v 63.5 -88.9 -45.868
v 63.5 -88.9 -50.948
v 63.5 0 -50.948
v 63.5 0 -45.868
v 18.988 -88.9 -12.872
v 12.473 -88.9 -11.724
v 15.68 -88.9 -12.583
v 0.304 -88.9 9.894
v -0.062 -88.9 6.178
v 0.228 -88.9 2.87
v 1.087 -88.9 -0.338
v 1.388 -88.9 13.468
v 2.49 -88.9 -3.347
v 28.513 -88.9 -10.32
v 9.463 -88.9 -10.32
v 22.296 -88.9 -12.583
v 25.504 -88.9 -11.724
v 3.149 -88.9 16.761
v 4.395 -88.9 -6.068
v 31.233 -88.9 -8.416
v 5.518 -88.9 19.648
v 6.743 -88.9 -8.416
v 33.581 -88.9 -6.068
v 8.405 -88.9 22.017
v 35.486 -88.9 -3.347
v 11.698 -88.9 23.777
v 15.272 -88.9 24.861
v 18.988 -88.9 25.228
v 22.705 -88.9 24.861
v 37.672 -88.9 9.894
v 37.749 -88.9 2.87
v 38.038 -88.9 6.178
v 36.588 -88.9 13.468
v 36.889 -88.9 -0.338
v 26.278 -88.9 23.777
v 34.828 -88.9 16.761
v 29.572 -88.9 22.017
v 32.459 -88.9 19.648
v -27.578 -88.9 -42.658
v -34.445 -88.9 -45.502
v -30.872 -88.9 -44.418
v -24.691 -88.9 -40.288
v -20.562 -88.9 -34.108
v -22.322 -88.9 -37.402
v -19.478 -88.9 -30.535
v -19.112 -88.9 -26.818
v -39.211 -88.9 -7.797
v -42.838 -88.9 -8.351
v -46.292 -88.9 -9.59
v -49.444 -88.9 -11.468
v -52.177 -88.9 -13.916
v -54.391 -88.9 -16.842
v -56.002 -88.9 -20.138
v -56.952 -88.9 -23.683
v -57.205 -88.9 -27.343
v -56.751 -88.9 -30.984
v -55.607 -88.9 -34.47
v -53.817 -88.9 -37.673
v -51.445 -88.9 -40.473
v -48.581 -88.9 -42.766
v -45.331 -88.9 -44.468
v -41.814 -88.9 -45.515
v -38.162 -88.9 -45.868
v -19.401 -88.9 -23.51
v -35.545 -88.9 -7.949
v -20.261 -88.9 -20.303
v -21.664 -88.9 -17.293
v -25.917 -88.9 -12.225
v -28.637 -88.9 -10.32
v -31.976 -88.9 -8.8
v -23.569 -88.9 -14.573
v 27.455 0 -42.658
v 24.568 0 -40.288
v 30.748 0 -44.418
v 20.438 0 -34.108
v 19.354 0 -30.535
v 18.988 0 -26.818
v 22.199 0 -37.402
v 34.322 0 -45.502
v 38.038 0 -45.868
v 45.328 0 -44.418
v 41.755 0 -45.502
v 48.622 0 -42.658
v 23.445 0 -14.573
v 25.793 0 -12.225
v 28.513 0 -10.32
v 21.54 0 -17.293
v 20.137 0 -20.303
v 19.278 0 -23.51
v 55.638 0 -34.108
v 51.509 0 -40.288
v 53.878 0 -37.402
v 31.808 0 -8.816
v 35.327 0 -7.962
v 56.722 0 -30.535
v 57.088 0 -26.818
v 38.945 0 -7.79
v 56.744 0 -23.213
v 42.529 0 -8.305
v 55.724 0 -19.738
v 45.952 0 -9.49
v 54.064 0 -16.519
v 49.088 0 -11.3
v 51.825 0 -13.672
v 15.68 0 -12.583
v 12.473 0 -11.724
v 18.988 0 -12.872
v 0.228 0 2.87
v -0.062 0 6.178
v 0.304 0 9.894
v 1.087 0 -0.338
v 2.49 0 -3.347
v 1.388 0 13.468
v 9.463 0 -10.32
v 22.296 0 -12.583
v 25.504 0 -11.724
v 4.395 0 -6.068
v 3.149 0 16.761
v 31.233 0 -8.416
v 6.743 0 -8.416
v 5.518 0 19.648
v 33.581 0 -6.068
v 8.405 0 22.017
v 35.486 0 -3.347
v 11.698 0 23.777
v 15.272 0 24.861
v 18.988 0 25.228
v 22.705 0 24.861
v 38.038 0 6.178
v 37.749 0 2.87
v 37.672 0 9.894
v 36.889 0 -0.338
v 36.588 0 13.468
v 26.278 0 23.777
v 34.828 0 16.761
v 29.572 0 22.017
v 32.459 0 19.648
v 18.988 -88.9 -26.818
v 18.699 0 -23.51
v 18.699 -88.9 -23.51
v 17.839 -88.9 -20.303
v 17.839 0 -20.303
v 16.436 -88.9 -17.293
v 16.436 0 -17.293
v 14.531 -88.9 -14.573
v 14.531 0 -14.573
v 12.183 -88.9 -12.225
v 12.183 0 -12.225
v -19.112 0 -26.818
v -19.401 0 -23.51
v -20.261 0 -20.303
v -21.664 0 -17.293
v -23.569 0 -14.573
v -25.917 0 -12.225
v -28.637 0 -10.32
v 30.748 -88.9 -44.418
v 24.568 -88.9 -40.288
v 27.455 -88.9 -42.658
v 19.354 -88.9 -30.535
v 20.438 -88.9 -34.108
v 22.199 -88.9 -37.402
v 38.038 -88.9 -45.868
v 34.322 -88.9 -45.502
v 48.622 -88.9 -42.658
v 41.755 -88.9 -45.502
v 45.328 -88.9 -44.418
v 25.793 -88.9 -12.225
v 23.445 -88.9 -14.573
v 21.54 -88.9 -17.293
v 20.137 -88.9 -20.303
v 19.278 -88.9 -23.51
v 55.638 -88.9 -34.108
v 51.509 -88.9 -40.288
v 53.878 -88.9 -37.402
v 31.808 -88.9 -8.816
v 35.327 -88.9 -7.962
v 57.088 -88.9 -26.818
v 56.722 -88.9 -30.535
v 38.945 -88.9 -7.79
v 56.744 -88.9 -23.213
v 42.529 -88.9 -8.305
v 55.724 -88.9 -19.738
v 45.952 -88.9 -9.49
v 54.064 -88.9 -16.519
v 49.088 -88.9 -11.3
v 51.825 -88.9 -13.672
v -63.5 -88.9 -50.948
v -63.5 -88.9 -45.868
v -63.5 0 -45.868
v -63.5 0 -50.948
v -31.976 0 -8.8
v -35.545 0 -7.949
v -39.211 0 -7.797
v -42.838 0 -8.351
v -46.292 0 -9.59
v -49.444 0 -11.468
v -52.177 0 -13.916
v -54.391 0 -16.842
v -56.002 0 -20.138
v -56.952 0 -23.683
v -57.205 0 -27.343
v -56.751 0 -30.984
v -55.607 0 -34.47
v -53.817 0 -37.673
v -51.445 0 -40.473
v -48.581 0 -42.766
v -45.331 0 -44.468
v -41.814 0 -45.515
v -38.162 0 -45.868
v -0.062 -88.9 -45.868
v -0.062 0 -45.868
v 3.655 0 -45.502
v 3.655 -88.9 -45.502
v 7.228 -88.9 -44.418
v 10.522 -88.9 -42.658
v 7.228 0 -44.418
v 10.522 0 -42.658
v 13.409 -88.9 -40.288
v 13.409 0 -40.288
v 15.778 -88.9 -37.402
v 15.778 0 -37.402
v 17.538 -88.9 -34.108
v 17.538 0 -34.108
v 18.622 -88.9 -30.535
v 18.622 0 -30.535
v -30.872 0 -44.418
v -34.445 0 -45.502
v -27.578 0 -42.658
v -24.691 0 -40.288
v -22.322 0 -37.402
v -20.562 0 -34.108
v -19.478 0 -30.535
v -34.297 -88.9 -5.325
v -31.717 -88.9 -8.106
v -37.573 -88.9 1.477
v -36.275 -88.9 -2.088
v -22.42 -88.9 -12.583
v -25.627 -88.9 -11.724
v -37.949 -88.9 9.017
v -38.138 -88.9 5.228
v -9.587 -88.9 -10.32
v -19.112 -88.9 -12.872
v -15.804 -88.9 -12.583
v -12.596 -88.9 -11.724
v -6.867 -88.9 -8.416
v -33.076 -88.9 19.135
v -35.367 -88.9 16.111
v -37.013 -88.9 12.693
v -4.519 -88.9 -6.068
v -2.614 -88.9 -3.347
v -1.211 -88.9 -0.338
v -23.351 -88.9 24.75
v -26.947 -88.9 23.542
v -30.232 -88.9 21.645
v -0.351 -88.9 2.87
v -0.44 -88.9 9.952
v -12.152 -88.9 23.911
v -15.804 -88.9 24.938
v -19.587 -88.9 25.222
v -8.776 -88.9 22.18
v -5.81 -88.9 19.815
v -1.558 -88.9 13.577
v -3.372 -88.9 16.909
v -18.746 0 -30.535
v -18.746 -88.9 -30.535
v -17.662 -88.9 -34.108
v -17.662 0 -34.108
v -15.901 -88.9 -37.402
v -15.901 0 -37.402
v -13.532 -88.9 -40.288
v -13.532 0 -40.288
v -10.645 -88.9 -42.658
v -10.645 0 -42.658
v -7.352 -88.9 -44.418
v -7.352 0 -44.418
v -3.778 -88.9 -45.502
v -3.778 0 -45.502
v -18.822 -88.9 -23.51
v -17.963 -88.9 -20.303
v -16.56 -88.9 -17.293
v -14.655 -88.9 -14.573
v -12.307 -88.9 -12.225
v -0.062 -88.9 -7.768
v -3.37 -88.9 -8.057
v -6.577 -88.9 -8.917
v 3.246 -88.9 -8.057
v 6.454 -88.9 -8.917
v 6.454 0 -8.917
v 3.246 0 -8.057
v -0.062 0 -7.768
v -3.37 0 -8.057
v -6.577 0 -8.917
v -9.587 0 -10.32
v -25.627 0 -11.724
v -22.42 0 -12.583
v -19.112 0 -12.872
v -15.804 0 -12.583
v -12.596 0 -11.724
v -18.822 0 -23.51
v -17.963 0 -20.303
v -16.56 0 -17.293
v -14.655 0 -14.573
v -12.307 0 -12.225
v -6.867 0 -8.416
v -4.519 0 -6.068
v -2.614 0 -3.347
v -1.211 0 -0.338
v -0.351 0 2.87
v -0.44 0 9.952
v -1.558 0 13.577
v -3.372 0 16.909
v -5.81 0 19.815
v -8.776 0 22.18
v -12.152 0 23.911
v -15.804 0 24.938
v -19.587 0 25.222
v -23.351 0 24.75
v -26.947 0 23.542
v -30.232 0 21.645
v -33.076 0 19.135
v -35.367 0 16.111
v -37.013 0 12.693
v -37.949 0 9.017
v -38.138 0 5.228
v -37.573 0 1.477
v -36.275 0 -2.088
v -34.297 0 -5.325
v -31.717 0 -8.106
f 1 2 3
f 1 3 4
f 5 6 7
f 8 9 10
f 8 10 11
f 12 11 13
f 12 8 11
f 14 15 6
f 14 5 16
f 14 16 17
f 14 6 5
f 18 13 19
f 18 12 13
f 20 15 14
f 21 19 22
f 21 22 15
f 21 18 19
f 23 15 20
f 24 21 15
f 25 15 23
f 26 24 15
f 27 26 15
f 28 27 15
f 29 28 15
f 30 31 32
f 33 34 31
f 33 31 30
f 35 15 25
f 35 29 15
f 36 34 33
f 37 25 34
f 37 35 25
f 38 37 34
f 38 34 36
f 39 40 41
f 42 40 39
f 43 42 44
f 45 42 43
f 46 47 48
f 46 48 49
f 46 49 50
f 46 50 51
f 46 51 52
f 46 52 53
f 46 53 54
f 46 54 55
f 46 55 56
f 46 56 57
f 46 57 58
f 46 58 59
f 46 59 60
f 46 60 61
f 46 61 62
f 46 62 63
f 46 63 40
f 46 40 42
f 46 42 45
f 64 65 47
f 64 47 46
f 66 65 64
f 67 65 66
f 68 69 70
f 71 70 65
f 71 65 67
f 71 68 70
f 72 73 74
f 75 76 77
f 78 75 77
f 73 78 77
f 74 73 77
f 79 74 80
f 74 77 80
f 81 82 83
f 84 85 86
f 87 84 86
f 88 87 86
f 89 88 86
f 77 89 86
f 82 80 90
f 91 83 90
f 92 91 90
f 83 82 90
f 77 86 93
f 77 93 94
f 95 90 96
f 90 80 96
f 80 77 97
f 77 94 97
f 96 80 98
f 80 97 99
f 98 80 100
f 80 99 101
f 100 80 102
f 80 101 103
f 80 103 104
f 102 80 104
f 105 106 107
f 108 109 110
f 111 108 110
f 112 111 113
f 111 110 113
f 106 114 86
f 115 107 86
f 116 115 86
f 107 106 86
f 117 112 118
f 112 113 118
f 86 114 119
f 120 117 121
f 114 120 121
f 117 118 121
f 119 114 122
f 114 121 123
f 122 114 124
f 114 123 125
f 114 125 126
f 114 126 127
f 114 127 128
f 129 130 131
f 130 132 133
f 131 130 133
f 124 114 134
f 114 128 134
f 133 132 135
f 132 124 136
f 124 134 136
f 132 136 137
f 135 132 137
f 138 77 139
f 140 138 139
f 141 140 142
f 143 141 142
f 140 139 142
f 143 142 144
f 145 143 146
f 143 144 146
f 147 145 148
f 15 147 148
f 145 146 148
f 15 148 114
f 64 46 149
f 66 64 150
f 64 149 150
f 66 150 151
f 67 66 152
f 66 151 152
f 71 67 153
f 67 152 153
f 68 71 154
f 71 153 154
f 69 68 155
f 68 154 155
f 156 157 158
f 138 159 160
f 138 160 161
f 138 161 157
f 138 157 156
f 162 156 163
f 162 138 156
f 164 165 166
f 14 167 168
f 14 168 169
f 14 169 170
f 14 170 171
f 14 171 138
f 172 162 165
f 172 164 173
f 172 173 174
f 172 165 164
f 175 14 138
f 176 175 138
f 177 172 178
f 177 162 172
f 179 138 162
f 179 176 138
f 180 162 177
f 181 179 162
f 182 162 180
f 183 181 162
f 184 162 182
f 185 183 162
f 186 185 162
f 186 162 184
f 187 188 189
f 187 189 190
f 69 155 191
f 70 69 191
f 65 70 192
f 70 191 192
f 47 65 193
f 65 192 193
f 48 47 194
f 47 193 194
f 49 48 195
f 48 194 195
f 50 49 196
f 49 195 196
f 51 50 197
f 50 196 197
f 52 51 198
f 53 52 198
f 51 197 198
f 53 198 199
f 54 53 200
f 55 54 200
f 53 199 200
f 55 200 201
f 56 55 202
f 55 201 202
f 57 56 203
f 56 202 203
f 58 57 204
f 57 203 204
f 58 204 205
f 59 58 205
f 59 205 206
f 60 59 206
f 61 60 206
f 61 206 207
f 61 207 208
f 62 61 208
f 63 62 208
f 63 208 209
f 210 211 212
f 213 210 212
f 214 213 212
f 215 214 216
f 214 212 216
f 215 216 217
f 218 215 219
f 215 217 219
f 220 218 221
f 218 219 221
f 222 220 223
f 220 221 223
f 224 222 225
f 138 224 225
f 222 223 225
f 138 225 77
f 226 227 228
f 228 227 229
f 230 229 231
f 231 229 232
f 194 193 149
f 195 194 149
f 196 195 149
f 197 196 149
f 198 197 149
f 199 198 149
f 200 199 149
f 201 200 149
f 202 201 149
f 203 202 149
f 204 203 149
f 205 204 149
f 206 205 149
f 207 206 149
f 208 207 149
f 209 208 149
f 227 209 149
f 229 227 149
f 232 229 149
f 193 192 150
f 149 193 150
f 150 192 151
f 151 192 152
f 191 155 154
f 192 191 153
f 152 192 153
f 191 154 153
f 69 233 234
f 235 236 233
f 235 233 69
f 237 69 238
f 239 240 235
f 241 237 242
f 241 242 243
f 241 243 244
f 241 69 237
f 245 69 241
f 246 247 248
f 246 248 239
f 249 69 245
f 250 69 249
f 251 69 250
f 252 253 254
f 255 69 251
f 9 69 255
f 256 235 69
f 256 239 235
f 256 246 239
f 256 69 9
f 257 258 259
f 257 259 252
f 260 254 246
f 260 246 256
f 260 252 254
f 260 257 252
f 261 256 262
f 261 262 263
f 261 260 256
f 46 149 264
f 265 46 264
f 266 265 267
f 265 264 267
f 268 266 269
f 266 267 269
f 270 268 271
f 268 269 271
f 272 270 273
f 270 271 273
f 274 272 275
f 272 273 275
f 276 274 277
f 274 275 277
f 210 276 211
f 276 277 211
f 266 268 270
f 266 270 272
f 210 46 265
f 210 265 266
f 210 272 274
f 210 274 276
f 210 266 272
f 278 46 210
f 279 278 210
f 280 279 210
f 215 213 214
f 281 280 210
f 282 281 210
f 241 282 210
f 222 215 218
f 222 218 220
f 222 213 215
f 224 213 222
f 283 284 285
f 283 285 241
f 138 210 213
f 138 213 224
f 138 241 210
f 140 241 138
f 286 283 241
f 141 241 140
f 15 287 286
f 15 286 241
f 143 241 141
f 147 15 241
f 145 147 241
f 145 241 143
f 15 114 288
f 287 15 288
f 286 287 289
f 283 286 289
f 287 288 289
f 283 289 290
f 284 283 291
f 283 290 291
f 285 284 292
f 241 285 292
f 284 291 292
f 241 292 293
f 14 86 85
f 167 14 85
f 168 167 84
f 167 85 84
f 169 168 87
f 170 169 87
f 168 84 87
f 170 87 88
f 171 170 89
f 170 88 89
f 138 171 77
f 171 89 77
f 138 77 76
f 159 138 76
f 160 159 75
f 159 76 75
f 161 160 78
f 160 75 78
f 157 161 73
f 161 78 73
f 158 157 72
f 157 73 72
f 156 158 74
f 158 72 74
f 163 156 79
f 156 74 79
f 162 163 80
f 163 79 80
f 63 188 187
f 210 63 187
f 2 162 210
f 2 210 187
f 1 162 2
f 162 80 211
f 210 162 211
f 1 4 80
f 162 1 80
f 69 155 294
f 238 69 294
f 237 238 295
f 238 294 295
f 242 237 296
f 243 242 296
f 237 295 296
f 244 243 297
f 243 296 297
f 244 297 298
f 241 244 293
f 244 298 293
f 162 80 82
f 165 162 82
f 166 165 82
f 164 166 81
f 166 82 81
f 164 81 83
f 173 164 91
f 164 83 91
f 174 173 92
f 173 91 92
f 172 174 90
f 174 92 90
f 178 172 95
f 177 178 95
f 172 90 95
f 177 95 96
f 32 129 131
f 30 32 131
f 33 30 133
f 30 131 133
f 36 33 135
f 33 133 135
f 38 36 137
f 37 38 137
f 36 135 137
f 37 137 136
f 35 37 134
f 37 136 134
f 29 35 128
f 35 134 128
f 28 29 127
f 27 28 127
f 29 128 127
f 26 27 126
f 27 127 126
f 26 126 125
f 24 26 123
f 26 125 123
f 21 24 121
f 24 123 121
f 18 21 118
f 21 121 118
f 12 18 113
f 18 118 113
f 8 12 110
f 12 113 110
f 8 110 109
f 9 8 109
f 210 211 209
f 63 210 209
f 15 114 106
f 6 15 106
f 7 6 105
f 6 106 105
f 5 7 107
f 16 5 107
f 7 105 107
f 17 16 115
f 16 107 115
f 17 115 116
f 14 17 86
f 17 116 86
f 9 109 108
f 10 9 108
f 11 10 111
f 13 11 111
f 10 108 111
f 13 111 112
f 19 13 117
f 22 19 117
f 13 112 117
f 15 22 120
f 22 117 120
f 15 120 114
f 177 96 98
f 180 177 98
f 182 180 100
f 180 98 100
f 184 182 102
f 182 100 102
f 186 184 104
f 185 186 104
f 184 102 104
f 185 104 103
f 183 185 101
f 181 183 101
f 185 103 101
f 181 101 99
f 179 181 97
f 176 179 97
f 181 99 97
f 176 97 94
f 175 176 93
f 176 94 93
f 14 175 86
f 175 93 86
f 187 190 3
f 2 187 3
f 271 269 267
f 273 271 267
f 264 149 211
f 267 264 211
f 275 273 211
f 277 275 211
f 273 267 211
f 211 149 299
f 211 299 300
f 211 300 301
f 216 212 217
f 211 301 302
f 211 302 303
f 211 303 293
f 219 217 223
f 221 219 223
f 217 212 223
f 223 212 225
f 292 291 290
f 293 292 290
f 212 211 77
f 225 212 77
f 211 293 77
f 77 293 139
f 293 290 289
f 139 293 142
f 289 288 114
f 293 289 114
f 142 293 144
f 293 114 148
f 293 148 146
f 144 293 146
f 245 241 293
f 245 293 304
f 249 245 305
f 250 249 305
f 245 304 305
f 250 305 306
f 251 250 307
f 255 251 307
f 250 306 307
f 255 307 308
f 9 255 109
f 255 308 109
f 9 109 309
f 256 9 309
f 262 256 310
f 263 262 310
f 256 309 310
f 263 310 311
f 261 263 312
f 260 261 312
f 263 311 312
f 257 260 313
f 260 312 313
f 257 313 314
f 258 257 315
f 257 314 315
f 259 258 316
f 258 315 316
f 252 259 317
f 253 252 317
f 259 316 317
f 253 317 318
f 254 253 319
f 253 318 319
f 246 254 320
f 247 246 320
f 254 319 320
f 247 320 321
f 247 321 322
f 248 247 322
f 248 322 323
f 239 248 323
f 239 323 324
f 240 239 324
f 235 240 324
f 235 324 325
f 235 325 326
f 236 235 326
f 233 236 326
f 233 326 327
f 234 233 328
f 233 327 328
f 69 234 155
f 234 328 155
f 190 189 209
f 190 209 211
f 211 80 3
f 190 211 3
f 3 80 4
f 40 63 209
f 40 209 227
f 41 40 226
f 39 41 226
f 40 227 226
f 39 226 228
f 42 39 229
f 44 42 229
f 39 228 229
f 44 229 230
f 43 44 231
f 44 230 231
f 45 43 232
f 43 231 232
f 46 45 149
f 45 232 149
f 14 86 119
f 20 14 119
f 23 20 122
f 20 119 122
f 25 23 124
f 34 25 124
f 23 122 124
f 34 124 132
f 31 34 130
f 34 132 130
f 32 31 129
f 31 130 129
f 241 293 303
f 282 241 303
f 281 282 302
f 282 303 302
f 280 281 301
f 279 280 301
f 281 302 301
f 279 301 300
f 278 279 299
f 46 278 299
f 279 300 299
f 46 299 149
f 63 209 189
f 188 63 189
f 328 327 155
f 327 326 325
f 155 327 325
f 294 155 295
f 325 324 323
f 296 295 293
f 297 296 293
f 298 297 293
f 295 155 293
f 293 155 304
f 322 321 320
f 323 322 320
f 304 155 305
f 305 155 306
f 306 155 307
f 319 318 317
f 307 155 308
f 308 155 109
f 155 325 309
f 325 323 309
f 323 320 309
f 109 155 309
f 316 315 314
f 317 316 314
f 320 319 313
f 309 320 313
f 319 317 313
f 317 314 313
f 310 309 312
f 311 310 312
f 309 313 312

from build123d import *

# Parameters (mm, degrees)
F1_DEPTH = 88.9


with BuildPart() as f1:
    # F0 (on Front) → F1 (new body)
    with BuildSketch(Plane.XZ):
        with BuildLine():
            ThreePointArc((-9.586811, -10.320259), (-2.614027, -3.347475), (-0.061811, 6.177525))
            ThreePointArc((-0.061811, 6.177525), (-28.636811, 22.675309), (-28.636811, -10.320258))
            ThreePointArc((-28.636811, -10.320258), (-19.111811, -12.872475), (-9.586811, -10.320259))
        make_face()
        with BuildLine():
            ThreePointArc((38.038189, 6.177525), (18.988189, 25.227525), (-0.061811, 6.177525))
            ThreePointArc((-0.061811, 6.177525), (2.490405, -3.347474), (9.463189, -10.320258))
            ThreePointArc((9.463189, -10.320258), (18.988189, -12.872475), (28.51319, -10.320258))
            ThreePointArc((28.51319, -10.320258), (35.485973, -3.347474), (38.038189, 6.177525))
        make_face()
        with BuildLine():
            ThreePointArc((9.463189, -10.320258), (-0.061811, -7.768042), (-9.586811, -10.320259))
            ThreePointArc((-9.586811, -10.320259), (-16.559595, -17.293043), (-19.111811, -26.818042))
            ThreePointArc((-19.111811, -26.818042), (-13.532195, -40.288427), (-0.061811, -45.868042))
            ThreePointArc((-0.061811, -45.868042), (13.408573, -40.288427), (18.988189, -26.818042))
            ThreePointArc((18.988189, -26.818042), (16.435973, -17.293042), (9.463189, -10.320258))
        make_face()
        with BuildLine():
            ThreePointArc((57.088189, -26.818042), (47.563189, -10.320259), (28.51319, -10.320258))
            ThreePointArc((28.51319, -10.320258), (21.540405, -17.293042), (18.988189, -26.818042))
            ThreePointArc((18.988189, -26.818042), (24.567805, -40.288427), (38.038189, -45.868042))
            ThreePointArc((38.038189, -45.868042), (51.508573, -40.288427), (57.088189, -26.818042))
        make_face()
        with BuildLine():
            ThreePointArc((-19.111811, -26.818042), (-21.664027, -17.293042), (-28.636811, -10.320258))
            ThreePointArc((-28.636811, -10.320258), (-56.562698, -21.88754), (-38.161811, -45.868042))
            ThreePointArc((-38.161811, -45.868042), (-24.691427, -40.288427), (-19.111811, -26.818042))
        make_face()
        Polygon((-0.061811, -45.868042), (-38.161811, -45.868042), (-63.5, -45.868042), (-63.5, -50.948042), (63.5, -50.948042), (63.5, -45.868042), (38.038189, -45.868042), align=None)
    extrude(amount=F1_DEPTH)


solid = f1.part
